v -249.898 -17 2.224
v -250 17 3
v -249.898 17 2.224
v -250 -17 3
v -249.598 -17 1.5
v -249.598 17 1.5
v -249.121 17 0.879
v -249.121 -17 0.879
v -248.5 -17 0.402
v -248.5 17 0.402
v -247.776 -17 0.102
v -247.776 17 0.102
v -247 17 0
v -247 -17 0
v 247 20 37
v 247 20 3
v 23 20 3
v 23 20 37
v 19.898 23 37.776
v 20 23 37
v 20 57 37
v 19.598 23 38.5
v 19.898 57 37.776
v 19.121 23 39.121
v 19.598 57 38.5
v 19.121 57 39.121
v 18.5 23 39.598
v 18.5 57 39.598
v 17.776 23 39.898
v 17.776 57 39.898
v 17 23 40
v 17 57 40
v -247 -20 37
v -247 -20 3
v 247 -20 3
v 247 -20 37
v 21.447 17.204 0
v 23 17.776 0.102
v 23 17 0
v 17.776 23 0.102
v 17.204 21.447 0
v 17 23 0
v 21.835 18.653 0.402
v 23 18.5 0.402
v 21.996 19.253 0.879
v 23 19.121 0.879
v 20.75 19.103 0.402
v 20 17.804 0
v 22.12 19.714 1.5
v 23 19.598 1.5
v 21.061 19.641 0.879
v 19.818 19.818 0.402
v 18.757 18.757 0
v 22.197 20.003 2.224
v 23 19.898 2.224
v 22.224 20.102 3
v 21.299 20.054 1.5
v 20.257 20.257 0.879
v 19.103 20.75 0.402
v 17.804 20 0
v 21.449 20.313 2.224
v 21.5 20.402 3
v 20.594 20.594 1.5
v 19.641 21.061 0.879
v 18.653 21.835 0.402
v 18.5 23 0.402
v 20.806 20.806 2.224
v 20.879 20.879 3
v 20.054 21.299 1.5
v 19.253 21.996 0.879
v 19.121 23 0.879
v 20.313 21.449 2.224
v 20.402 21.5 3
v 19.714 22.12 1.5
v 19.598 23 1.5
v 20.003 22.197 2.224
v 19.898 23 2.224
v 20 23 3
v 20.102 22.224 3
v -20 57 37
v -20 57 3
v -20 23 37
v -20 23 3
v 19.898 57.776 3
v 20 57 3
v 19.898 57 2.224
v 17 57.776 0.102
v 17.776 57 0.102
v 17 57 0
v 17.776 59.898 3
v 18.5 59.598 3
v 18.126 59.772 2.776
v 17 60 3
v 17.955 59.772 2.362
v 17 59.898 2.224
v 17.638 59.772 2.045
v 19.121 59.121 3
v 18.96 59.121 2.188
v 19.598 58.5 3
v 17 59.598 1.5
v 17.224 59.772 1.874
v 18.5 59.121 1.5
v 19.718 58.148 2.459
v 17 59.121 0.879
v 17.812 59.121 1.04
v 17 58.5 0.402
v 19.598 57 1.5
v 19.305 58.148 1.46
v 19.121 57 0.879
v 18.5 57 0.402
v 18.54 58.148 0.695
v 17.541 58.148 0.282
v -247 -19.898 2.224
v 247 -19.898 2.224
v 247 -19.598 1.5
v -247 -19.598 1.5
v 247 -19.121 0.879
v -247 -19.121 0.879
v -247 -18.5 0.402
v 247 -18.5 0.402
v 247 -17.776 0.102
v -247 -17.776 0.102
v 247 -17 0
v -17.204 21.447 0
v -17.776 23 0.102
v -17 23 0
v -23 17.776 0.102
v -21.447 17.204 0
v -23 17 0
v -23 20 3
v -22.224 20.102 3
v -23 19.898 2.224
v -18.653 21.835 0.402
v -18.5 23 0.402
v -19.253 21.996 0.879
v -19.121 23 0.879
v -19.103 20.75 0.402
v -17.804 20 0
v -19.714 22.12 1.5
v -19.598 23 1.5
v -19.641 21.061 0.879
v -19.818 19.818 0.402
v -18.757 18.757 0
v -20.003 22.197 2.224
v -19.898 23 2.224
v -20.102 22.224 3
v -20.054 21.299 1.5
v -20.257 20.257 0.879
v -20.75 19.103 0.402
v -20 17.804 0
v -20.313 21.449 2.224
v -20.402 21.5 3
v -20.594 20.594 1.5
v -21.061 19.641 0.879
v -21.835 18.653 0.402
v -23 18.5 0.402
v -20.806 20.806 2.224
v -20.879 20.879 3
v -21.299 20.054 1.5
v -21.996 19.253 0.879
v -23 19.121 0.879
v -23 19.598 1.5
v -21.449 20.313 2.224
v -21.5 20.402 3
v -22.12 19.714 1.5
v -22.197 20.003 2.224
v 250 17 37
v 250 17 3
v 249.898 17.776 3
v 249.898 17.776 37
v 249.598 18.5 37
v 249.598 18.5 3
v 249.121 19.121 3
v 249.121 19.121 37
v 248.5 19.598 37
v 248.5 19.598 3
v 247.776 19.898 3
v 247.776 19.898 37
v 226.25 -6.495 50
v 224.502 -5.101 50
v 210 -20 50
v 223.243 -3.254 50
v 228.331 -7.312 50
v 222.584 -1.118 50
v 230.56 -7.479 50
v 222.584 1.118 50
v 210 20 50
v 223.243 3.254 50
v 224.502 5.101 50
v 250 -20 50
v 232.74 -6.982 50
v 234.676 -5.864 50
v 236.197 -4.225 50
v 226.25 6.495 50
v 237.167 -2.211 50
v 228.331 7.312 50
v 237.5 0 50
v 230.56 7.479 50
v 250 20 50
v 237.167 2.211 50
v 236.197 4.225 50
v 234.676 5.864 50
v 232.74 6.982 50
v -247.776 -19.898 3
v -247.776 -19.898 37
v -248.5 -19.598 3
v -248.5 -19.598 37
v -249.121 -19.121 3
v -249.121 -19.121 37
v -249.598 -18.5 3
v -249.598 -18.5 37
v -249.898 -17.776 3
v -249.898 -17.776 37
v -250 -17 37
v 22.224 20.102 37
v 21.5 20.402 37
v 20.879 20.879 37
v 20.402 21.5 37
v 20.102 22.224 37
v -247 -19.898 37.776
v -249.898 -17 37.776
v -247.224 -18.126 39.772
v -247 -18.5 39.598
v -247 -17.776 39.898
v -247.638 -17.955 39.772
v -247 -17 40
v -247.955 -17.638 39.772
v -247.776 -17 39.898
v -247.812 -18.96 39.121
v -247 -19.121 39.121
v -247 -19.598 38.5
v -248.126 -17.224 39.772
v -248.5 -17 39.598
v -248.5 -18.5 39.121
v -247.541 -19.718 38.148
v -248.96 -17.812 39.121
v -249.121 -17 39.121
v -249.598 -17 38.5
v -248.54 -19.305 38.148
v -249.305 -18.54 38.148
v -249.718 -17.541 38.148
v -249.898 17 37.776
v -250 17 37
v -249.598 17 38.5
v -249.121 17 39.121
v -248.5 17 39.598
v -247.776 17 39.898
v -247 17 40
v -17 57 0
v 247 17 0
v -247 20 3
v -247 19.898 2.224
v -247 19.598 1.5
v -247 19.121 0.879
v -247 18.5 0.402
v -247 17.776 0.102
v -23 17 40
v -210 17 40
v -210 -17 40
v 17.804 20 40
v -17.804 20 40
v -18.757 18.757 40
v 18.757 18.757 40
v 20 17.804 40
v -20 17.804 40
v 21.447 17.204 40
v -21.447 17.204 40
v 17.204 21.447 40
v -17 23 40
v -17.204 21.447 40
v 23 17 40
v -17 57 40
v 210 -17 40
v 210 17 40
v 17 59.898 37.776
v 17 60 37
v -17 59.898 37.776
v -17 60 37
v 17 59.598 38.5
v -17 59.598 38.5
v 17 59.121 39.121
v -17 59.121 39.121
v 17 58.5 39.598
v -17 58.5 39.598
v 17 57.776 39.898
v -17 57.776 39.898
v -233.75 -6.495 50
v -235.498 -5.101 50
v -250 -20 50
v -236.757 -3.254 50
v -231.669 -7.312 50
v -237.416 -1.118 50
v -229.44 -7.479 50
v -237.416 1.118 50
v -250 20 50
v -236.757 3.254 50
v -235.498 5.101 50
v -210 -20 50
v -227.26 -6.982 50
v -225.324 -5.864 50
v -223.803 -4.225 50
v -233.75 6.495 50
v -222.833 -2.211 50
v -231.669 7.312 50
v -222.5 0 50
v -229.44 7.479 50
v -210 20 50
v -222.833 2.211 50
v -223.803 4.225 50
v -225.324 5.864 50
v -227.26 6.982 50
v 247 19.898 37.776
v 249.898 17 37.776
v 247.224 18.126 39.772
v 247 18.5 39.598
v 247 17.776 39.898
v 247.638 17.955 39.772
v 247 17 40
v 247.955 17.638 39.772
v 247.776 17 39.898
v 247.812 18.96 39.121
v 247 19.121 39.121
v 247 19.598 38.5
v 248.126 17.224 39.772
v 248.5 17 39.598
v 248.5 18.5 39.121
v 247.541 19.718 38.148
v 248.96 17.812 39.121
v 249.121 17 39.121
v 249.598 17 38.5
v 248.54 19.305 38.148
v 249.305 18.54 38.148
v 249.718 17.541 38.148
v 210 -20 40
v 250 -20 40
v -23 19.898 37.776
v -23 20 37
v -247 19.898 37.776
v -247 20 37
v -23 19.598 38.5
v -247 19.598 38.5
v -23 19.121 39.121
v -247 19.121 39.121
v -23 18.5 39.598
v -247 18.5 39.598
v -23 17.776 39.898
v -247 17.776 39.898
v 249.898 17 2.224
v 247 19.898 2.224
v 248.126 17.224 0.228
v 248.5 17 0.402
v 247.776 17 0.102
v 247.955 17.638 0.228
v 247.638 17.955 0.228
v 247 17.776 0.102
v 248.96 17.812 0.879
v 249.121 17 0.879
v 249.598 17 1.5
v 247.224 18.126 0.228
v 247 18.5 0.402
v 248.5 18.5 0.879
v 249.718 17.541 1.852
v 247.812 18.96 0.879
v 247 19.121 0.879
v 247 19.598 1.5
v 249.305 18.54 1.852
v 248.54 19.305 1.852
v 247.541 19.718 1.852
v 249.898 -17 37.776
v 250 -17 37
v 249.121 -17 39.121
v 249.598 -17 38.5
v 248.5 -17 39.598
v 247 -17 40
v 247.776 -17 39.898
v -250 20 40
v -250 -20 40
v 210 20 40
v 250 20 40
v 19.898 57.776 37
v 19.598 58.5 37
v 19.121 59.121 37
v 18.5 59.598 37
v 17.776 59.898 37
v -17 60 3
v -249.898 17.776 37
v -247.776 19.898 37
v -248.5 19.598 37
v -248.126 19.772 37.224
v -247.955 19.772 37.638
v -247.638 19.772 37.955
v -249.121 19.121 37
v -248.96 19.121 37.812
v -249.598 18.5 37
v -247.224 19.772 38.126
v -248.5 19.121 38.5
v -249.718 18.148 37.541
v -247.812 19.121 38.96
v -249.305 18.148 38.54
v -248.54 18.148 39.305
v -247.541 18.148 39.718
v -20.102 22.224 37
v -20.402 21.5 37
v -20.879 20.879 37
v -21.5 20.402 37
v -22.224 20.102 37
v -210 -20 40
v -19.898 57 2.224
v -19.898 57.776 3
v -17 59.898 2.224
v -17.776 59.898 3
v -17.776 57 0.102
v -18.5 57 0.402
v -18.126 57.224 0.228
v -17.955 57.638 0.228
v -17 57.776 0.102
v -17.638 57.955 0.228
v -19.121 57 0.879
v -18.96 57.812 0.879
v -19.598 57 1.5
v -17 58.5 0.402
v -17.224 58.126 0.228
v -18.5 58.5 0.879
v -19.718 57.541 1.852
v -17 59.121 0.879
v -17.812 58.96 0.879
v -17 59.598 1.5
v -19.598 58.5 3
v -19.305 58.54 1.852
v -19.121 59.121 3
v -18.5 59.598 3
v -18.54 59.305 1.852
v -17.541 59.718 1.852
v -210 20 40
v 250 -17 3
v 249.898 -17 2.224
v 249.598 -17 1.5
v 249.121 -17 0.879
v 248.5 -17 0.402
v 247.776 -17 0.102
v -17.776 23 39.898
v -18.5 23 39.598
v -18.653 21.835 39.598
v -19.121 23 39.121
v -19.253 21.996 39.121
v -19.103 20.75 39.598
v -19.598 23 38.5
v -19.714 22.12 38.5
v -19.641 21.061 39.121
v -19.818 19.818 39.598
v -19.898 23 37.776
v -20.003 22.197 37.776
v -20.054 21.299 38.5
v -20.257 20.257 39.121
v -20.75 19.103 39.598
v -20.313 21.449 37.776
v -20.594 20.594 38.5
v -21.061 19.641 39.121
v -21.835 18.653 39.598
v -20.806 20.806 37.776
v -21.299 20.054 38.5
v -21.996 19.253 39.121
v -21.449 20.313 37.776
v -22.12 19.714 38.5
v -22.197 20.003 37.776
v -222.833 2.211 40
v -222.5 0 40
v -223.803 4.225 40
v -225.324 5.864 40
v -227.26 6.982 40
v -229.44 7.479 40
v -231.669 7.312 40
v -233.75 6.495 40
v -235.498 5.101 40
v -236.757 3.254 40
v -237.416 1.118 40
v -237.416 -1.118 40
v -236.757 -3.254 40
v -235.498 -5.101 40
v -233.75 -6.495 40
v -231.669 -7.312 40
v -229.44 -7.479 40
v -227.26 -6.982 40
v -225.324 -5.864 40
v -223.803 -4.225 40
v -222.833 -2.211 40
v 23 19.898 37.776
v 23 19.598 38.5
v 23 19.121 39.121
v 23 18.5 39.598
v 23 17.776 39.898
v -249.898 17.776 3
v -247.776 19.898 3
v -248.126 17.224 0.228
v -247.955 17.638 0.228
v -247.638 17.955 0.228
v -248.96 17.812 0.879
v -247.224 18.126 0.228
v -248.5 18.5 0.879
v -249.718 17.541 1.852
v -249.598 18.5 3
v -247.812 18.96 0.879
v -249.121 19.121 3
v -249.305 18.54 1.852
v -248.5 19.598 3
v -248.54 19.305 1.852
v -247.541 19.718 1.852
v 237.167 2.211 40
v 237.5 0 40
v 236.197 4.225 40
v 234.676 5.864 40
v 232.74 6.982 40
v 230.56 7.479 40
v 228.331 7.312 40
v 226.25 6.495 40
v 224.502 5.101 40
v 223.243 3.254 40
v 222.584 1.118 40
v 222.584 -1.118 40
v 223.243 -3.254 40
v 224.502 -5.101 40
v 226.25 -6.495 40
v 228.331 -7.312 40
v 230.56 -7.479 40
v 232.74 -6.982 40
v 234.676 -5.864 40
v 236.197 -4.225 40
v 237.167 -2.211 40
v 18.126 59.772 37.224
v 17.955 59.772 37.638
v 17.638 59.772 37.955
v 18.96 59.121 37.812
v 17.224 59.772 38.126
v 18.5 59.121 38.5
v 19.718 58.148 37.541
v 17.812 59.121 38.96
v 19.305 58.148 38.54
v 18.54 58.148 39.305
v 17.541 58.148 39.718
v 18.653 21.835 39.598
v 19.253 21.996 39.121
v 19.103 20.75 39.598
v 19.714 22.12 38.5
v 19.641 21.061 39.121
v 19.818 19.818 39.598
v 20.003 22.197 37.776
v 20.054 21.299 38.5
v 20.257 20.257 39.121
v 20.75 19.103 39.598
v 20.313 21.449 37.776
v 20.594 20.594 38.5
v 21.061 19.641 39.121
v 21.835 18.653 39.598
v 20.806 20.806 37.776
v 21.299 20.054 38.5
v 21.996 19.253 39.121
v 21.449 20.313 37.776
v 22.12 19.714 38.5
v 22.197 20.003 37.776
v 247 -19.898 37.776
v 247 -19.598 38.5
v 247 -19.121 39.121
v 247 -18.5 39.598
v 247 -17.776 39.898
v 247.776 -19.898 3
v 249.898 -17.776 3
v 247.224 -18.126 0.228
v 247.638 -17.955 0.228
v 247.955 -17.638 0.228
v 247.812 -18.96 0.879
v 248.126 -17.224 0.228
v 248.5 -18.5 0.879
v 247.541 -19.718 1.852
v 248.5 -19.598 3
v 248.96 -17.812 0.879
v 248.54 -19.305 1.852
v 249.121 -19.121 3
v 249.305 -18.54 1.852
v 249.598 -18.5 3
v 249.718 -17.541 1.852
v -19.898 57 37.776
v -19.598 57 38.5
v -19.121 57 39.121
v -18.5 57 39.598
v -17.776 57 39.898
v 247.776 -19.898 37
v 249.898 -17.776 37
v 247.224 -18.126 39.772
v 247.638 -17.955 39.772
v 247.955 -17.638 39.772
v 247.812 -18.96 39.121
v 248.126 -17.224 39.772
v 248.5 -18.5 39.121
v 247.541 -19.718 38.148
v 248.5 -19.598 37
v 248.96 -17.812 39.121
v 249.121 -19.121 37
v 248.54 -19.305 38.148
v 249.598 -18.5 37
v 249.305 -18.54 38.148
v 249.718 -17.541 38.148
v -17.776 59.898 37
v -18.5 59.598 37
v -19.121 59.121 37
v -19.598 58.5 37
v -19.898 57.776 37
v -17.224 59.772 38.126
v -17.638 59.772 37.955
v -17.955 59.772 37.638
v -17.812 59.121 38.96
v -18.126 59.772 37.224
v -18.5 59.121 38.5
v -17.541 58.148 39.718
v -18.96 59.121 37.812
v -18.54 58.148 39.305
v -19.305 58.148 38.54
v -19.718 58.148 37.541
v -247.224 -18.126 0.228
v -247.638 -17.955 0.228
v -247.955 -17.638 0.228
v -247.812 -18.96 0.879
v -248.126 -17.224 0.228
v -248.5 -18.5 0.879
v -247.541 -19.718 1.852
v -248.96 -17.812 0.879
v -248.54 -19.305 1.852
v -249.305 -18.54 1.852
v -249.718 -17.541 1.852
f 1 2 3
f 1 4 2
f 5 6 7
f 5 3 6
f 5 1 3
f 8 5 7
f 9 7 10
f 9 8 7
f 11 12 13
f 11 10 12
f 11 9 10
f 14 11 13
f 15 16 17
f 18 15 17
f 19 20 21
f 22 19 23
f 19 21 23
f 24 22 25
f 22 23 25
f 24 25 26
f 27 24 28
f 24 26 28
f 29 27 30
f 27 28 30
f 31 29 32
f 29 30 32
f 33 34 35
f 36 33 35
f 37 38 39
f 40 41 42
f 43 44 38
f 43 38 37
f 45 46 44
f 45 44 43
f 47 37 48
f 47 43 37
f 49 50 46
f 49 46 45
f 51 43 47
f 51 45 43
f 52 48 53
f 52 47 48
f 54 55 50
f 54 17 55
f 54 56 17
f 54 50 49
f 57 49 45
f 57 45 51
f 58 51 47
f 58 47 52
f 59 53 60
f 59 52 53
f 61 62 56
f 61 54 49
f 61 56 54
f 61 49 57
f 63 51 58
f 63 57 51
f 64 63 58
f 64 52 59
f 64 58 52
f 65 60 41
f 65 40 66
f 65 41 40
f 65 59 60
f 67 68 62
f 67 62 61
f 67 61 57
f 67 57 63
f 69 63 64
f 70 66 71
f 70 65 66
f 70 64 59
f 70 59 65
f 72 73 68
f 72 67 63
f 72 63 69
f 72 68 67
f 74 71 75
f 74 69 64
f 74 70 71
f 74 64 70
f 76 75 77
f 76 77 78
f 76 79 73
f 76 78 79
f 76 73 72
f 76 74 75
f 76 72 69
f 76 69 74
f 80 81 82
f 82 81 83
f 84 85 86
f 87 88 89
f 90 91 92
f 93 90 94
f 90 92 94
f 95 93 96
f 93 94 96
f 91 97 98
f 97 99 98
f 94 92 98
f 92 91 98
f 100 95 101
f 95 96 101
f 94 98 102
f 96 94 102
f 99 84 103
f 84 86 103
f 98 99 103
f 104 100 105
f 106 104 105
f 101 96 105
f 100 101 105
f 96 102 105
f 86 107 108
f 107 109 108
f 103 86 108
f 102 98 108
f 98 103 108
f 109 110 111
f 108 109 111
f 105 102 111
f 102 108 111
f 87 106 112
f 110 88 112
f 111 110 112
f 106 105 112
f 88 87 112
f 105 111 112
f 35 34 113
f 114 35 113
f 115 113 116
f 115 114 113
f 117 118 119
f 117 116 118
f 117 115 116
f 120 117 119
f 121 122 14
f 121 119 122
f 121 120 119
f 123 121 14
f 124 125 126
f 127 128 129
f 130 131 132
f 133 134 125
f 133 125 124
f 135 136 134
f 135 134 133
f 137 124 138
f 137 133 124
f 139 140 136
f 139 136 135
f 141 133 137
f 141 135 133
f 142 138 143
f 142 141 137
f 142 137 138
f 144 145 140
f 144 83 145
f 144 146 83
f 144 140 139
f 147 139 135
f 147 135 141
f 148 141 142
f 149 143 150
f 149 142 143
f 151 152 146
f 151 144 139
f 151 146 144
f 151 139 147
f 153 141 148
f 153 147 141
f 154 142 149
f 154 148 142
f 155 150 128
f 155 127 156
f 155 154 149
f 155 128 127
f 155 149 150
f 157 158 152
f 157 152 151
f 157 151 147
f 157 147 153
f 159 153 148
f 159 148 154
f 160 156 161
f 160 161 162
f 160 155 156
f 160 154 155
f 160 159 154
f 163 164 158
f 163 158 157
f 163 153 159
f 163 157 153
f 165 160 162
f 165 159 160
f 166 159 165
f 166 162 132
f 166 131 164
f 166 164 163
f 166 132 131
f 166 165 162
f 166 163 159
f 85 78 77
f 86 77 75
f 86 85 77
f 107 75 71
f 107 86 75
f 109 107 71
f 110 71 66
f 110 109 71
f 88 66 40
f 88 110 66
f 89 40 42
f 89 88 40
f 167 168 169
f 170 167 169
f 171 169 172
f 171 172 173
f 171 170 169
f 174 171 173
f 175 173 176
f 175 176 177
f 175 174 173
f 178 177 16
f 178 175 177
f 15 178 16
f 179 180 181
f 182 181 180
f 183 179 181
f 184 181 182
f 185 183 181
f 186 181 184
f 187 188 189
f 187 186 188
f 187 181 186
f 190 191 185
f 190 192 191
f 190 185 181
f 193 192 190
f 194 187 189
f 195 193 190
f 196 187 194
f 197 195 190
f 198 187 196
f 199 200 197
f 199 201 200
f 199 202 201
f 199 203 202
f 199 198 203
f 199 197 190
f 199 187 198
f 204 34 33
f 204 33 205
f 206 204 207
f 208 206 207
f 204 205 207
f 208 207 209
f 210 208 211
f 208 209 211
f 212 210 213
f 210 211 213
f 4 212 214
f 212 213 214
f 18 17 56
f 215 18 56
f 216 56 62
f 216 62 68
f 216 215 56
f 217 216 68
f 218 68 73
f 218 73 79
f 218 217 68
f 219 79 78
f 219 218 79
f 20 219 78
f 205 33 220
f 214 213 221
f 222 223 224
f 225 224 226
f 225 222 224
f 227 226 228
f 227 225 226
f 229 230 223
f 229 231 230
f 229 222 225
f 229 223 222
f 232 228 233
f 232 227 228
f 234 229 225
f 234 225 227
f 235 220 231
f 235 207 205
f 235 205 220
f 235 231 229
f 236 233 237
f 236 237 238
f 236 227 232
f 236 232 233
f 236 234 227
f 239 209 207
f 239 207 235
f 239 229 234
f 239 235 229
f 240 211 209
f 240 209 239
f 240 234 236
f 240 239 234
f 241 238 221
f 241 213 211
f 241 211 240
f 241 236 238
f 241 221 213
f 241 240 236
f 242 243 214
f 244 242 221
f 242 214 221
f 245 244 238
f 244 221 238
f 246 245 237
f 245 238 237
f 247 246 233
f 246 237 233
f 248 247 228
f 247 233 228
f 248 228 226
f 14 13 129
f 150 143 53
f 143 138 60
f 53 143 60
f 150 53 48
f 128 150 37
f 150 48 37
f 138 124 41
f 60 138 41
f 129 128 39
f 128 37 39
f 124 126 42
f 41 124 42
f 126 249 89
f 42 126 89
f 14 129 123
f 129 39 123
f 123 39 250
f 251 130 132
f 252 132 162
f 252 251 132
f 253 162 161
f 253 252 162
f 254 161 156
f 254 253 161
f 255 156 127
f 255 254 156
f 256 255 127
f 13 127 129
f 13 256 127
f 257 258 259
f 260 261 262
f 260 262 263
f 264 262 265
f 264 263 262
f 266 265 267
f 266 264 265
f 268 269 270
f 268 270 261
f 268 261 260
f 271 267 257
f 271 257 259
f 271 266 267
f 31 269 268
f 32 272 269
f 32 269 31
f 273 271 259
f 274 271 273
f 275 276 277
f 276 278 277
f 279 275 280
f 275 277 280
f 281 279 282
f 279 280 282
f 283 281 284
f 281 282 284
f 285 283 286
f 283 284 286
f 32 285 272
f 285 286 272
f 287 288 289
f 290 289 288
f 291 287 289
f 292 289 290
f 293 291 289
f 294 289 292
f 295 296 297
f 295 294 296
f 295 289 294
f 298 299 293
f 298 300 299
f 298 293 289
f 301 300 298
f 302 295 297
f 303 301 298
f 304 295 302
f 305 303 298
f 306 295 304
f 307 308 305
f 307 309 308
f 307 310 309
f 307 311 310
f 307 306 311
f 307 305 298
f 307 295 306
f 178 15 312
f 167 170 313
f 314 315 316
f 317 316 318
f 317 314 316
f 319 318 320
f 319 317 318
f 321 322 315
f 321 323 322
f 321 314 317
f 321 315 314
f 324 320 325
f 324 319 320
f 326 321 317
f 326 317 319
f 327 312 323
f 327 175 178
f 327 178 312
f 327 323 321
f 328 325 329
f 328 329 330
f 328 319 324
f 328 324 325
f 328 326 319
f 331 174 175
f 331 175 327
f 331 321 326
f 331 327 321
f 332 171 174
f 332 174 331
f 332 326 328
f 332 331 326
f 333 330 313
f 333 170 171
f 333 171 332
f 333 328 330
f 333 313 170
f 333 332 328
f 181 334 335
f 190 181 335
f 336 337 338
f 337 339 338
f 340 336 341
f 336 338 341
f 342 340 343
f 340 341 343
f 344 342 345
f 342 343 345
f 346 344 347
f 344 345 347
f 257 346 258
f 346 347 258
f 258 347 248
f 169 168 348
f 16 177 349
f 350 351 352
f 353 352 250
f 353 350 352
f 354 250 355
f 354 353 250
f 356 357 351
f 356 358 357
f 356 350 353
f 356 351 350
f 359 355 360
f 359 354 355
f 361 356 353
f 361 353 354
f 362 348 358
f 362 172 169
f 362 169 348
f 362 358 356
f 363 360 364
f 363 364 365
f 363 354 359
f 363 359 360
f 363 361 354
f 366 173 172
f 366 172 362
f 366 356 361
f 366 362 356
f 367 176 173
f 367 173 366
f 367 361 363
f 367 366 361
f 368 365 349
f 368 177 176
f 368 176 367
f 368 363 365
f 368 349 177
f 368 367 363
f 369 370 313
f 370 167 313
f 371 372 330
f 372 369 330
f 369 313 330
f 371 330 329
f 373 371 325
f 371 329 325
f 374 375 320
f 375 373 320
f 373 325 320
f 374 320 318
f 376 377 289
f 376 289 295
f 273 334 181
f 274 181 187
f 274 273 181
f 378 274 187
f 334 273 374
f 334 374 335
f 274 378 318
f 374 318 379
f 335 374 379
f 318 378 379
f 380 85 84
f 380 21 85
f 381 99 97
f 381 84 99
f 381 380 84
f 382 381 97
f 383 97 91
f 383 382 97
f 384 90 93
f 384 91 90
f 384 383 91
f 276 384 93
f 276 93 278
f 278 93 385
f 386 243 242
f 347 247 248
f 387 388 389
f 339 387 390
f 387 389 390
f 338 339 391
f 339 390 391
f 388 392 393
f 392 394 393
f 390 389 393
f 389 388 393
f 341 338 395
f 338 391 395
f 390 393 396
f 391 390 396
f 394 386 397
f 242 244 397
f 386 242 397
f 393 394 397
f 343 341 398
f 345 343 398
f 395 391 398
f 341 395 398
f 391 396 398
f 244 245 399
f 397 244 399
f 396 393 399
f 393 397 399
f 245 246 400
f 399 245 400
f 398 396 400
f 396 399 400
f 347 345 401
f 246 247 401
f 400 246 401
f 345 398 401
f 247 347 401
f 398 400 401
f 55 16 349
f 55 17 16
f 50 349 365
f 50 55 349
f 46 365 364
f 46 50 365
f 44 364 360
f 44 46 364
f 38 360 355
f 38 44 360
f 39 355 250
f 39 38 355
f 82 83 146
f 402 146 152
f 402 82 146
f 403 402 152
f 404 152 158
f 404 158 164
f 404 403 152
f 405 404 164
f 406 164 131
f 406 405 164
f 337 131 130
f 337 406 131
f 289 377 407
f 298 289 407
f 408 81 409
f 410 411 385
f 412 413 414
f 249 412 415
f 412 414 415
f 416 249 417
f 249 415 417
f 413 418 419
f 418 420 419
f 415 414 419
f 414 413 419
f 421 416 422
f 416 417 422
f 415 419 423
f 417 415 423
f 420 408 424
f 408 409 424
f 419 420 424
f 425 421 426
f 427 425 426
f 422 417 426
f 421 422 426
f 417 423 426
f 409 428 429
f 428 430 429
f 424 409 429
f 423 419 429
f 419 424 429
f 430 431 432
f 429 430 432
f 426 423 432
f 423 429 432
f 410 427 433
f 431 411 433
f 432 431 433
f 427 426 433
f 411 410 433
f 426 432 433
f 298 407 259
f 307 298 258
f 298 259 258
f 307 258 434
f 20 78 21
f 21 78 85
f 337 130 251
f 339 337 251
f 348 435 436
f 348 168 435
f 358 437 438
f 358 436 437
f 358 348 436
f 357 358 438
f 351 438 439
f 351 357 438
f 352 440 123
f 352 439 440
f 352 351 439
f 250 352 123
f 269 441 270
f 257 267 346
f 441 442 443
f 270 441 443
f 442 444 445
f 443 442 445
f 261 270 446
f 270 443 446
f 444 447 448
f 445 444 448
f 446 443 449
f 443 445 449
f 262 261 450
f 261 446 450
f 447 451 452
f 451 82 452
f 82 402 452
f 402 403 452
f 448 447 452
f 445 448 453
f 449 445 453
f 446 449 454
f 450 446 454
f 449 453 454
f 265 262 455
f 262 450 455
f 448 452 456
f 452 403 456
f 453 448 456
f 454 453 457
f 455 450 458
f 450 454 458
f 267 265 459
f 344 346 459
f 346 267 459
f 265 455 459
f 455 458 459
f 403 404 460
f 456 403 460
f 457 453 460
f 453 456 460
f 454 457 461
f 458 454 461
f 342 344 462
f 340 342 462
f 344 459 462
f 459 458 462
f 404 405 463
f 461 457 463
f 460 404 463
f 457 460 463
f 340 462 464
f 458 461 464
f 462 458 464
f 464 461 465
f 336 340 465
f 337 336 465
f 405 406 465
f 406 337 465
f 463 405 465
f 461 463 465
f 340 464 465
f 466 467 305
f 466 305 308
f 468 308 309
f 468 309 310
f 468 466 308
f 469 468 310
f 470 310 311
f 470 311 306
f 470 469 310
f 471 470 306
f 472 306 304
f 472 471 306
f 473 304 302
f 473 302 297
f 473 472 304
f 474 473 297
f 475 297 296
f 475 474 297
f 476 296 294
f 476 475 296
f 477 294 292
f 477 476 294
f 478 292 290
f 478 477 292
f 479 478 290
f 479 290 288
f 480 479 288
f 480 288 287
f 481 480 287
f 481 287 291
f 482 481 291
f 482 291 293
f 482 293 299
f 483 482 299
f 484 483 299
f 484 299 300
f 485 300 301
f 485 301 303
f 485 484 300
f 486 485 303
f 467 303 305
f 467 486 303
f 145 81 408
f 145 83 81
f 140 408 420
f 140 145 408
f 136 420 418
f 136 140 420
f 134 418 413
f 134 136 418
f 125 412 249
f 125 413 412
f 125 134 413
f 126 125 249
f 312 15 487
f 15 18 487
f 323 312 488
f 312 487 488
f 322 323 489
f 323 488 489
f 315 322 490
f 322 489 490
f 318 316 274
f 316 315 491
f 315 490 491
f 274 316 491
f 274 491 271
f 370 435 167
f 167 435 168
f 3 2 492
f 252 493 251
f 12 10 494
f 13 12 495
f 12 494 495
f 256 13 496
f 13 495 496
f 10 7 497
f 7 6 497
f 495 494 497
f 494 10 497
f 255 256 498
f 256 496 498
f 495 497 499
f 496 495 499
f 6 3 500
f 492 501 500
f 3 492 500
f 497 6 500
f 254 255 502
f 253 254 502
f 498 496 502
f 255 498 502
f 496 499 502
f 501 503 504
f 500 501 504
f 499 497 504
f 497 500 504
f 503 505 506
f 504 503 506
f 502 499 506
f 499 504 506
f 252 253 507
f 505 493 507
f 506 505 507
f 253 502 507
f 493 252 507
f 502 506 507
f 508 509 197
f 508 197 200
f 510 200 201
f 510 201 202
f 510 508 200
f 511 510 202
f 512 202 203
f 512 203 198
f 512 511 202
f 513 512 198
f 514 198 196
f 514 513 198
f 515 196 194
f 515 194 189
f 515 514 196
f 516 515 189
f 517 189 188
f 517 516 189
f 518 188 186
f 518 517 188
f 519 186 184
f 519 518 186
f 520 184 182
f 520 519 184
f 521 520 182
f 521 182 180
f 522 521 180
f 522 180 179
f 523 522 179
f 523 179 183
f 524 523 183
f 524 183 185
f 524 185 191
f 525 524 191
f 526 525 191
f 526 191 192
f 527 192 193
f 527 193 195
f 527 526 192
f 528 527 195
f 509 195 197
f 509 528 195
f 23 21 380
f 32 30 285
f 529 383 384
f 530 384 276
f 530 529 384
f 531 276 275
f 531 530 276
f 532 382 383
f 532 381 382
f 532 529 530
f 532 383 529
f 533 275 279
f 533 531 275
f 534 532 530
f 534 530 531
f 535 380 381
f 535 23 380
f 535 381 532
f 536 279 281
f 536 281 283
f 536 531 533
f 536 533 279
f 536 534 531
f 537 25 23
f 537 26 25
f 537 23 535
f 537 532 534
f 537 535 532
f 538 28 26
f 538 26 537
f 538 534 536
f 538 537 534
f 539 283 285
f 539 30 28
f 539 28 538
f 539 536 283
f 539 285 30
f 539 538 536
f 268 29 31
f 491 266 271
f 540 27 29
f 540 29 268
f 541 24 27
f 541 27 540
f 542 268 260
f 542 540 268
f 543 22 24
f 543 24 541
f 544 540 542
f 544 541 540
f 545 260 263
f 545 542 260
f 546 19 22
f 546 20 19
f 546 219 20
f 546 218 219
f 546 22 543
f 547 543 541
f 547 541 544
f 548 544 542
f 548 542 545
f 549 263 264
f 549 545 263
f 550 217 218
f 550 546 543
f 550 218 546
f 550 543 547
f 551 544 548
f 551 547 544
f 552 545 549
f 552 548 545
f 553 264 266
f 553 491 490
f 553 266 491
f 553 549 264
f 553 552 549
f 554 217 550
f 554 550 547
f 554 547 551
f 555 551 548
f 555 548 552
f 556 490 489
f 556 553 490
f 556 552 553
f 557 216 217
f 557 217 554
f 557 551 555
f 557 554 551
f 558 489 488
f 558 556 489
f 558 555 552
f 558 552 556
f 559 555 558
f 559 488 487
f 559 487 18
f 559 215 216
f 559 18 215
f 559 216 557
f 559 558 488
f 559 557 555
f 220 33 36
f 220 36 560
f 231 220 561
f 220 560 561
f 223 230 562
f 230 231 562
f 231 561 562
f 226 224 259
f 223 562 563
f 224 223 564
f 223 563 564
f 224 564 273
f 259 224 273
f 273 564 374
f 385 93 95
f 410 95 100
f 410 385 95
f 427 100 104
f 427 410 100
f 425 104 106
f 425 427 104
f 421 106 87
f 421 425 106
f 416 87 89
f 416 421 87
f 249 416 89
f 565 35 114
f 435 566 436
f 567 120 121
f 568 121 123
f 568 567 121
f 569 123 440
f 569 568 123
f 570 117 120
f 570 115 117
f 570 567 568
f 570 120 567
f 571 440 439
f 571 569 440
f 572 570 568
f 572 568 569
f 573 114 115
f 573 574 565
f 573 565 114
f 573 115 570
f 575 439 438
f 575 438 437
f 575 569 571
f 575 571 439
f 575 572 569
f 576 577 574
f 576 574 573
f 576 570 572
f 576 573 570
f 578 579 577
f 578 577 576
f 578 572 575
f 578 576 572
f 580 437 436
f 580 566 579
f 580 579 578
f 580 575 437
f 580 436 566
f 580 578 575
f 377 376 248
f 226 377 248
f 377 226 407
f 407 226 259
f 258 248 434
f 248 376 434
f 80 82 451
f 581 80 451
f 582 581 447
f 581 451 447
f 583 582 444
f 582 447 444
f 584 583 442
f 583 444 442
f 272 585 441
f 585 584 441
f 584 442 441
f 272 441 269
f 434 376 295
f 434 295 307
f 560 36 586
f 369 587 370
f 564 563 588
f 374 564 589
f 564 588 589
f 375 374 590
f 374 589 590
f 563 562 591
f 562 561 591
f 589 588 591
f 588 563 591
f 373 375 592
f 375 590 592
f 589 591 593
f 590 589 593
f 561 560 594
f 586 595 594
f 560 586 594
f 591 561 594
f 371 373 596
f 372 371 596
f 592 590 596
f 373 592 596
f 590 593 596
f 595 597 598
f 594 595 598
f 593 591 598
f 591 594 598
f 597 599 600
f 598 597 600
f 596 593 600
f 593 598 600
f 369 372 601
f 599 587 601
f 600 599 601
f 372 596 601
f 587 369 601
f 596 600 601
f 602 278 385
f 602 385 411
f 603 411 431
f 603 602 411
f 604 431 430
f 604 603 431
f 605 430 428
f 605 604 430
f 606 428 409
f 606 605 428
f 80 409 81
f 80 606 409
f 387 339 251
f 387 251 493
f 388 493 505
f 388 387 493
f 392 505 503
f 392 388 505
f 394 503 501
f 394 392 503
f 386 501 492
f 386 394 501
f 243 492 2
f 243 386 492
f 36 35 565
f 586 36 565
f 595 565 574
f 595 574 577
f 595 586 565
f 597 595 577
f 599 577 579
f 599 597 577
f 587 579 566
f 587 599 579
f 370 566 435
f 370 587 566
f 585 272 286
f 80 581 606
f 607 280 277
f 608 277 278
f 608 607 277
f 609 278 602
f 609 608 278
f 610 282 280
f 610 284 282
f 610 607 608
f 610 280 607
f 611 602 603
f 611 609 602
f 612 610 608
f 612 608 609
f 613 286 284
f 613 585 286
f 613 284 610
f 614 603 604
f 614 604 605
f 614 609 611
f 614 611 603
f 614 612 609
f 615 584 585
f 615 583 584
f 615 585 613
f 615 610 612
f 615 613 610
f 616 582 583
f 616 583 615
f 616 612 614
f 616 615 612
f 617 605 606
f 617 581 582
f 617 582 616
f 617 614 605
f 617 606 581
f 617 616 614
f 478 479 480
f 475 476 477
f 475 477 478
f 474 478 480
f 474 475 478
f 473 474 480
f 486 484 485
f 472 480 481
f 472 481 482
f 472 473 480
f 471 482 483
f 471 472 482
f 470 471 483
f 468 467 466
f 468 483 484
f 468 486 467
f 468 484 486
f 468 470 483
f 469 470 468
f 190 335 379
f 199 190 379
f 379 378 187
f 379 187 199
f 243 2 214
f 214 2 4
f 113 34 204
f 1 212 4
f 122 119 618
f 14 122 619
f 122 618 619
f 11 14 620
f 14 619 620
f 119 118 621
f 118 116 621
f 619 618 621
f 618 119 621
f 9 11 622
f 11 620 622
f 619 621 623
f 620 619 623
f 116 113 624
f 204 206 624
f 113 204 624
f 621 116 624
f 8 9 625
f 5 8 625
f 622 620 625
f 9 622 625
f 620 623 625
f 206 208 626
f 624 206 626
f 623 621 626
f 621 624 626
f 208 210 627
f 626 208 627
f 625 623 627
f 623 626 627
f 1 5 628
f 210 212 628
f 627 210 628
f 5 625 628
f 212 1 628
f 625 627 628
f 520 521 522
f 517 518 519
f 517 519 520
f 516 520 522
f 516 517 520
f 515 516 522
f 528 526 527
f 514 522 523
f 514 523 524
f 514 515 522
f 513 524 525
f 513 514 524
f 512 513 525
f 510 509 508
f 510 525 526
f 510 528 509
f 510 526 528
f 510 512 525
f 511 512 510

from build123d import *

# Parameters (mm, degrees)
F1_DEPTH = 40
F2_R     = 3
F3_W     = 40
F3_H     = 40
F3_R     = 7.5
F4_DEPTH = 10


with BuildPart() as f1:
    # F0 (on Top) → F1 (new body)
    with BuildSketch(Plane.XY):
        Polygon((-250, -20), (250, -20), (250, 20), (20, 20), (20, 60), (-20, 60), (-20, 20), (-250, 20), align=None)
    extrude(amount=F1_DEPTH)

    # F2
    f2_edges = [f1.edges().sort_by_distance(p)[0] for p in [
        (250, 20, 20),
        (-250, -20, 20),
        (250, -20, 20),
        (0, -20, 0),
        (0, -20, 40),
        (135, 20, 40),
        (250, 0, 0),
        (250, 0, 40),
        (-250, 0, 40),
        (20, 20, 20),
        (-250, 20, 20),
        (135, 20, 0),
        (-250, 0, 0),
        (20, 40, 0),
        (-20, 40, 40),
        (-135, 20, 40),
        (20, 40, 40),
        (20, 60, 20),
        (0, 60, 40),
        (-135, 20, 0),
        (-20, 20, 20),
        (-20, 60, 20),
        (-20, 40, 0),
        (0, 60, 0),
    ]]
    fillet(f2_edges, radius=F2_R)

    # F3 (on face) → F4 (join)
    with BuildSketch(Plane.XY.offset(40)):
        with Locations((-230, 0)):
            Rectangle(F3_W, F3_H)
        with Locations((-230, 0)):
            Circle(F3_R, mode=Mode.SUBTRACT)
        with Locations((230, 0)):
            Rectangle(F3_W, F3_H)
        with Locations((230, 0)):
            Circle(F3_R, mode=Mode.SUBTRACT)
    extrude(amount=F4_DEPTH)


solid = f1.part
